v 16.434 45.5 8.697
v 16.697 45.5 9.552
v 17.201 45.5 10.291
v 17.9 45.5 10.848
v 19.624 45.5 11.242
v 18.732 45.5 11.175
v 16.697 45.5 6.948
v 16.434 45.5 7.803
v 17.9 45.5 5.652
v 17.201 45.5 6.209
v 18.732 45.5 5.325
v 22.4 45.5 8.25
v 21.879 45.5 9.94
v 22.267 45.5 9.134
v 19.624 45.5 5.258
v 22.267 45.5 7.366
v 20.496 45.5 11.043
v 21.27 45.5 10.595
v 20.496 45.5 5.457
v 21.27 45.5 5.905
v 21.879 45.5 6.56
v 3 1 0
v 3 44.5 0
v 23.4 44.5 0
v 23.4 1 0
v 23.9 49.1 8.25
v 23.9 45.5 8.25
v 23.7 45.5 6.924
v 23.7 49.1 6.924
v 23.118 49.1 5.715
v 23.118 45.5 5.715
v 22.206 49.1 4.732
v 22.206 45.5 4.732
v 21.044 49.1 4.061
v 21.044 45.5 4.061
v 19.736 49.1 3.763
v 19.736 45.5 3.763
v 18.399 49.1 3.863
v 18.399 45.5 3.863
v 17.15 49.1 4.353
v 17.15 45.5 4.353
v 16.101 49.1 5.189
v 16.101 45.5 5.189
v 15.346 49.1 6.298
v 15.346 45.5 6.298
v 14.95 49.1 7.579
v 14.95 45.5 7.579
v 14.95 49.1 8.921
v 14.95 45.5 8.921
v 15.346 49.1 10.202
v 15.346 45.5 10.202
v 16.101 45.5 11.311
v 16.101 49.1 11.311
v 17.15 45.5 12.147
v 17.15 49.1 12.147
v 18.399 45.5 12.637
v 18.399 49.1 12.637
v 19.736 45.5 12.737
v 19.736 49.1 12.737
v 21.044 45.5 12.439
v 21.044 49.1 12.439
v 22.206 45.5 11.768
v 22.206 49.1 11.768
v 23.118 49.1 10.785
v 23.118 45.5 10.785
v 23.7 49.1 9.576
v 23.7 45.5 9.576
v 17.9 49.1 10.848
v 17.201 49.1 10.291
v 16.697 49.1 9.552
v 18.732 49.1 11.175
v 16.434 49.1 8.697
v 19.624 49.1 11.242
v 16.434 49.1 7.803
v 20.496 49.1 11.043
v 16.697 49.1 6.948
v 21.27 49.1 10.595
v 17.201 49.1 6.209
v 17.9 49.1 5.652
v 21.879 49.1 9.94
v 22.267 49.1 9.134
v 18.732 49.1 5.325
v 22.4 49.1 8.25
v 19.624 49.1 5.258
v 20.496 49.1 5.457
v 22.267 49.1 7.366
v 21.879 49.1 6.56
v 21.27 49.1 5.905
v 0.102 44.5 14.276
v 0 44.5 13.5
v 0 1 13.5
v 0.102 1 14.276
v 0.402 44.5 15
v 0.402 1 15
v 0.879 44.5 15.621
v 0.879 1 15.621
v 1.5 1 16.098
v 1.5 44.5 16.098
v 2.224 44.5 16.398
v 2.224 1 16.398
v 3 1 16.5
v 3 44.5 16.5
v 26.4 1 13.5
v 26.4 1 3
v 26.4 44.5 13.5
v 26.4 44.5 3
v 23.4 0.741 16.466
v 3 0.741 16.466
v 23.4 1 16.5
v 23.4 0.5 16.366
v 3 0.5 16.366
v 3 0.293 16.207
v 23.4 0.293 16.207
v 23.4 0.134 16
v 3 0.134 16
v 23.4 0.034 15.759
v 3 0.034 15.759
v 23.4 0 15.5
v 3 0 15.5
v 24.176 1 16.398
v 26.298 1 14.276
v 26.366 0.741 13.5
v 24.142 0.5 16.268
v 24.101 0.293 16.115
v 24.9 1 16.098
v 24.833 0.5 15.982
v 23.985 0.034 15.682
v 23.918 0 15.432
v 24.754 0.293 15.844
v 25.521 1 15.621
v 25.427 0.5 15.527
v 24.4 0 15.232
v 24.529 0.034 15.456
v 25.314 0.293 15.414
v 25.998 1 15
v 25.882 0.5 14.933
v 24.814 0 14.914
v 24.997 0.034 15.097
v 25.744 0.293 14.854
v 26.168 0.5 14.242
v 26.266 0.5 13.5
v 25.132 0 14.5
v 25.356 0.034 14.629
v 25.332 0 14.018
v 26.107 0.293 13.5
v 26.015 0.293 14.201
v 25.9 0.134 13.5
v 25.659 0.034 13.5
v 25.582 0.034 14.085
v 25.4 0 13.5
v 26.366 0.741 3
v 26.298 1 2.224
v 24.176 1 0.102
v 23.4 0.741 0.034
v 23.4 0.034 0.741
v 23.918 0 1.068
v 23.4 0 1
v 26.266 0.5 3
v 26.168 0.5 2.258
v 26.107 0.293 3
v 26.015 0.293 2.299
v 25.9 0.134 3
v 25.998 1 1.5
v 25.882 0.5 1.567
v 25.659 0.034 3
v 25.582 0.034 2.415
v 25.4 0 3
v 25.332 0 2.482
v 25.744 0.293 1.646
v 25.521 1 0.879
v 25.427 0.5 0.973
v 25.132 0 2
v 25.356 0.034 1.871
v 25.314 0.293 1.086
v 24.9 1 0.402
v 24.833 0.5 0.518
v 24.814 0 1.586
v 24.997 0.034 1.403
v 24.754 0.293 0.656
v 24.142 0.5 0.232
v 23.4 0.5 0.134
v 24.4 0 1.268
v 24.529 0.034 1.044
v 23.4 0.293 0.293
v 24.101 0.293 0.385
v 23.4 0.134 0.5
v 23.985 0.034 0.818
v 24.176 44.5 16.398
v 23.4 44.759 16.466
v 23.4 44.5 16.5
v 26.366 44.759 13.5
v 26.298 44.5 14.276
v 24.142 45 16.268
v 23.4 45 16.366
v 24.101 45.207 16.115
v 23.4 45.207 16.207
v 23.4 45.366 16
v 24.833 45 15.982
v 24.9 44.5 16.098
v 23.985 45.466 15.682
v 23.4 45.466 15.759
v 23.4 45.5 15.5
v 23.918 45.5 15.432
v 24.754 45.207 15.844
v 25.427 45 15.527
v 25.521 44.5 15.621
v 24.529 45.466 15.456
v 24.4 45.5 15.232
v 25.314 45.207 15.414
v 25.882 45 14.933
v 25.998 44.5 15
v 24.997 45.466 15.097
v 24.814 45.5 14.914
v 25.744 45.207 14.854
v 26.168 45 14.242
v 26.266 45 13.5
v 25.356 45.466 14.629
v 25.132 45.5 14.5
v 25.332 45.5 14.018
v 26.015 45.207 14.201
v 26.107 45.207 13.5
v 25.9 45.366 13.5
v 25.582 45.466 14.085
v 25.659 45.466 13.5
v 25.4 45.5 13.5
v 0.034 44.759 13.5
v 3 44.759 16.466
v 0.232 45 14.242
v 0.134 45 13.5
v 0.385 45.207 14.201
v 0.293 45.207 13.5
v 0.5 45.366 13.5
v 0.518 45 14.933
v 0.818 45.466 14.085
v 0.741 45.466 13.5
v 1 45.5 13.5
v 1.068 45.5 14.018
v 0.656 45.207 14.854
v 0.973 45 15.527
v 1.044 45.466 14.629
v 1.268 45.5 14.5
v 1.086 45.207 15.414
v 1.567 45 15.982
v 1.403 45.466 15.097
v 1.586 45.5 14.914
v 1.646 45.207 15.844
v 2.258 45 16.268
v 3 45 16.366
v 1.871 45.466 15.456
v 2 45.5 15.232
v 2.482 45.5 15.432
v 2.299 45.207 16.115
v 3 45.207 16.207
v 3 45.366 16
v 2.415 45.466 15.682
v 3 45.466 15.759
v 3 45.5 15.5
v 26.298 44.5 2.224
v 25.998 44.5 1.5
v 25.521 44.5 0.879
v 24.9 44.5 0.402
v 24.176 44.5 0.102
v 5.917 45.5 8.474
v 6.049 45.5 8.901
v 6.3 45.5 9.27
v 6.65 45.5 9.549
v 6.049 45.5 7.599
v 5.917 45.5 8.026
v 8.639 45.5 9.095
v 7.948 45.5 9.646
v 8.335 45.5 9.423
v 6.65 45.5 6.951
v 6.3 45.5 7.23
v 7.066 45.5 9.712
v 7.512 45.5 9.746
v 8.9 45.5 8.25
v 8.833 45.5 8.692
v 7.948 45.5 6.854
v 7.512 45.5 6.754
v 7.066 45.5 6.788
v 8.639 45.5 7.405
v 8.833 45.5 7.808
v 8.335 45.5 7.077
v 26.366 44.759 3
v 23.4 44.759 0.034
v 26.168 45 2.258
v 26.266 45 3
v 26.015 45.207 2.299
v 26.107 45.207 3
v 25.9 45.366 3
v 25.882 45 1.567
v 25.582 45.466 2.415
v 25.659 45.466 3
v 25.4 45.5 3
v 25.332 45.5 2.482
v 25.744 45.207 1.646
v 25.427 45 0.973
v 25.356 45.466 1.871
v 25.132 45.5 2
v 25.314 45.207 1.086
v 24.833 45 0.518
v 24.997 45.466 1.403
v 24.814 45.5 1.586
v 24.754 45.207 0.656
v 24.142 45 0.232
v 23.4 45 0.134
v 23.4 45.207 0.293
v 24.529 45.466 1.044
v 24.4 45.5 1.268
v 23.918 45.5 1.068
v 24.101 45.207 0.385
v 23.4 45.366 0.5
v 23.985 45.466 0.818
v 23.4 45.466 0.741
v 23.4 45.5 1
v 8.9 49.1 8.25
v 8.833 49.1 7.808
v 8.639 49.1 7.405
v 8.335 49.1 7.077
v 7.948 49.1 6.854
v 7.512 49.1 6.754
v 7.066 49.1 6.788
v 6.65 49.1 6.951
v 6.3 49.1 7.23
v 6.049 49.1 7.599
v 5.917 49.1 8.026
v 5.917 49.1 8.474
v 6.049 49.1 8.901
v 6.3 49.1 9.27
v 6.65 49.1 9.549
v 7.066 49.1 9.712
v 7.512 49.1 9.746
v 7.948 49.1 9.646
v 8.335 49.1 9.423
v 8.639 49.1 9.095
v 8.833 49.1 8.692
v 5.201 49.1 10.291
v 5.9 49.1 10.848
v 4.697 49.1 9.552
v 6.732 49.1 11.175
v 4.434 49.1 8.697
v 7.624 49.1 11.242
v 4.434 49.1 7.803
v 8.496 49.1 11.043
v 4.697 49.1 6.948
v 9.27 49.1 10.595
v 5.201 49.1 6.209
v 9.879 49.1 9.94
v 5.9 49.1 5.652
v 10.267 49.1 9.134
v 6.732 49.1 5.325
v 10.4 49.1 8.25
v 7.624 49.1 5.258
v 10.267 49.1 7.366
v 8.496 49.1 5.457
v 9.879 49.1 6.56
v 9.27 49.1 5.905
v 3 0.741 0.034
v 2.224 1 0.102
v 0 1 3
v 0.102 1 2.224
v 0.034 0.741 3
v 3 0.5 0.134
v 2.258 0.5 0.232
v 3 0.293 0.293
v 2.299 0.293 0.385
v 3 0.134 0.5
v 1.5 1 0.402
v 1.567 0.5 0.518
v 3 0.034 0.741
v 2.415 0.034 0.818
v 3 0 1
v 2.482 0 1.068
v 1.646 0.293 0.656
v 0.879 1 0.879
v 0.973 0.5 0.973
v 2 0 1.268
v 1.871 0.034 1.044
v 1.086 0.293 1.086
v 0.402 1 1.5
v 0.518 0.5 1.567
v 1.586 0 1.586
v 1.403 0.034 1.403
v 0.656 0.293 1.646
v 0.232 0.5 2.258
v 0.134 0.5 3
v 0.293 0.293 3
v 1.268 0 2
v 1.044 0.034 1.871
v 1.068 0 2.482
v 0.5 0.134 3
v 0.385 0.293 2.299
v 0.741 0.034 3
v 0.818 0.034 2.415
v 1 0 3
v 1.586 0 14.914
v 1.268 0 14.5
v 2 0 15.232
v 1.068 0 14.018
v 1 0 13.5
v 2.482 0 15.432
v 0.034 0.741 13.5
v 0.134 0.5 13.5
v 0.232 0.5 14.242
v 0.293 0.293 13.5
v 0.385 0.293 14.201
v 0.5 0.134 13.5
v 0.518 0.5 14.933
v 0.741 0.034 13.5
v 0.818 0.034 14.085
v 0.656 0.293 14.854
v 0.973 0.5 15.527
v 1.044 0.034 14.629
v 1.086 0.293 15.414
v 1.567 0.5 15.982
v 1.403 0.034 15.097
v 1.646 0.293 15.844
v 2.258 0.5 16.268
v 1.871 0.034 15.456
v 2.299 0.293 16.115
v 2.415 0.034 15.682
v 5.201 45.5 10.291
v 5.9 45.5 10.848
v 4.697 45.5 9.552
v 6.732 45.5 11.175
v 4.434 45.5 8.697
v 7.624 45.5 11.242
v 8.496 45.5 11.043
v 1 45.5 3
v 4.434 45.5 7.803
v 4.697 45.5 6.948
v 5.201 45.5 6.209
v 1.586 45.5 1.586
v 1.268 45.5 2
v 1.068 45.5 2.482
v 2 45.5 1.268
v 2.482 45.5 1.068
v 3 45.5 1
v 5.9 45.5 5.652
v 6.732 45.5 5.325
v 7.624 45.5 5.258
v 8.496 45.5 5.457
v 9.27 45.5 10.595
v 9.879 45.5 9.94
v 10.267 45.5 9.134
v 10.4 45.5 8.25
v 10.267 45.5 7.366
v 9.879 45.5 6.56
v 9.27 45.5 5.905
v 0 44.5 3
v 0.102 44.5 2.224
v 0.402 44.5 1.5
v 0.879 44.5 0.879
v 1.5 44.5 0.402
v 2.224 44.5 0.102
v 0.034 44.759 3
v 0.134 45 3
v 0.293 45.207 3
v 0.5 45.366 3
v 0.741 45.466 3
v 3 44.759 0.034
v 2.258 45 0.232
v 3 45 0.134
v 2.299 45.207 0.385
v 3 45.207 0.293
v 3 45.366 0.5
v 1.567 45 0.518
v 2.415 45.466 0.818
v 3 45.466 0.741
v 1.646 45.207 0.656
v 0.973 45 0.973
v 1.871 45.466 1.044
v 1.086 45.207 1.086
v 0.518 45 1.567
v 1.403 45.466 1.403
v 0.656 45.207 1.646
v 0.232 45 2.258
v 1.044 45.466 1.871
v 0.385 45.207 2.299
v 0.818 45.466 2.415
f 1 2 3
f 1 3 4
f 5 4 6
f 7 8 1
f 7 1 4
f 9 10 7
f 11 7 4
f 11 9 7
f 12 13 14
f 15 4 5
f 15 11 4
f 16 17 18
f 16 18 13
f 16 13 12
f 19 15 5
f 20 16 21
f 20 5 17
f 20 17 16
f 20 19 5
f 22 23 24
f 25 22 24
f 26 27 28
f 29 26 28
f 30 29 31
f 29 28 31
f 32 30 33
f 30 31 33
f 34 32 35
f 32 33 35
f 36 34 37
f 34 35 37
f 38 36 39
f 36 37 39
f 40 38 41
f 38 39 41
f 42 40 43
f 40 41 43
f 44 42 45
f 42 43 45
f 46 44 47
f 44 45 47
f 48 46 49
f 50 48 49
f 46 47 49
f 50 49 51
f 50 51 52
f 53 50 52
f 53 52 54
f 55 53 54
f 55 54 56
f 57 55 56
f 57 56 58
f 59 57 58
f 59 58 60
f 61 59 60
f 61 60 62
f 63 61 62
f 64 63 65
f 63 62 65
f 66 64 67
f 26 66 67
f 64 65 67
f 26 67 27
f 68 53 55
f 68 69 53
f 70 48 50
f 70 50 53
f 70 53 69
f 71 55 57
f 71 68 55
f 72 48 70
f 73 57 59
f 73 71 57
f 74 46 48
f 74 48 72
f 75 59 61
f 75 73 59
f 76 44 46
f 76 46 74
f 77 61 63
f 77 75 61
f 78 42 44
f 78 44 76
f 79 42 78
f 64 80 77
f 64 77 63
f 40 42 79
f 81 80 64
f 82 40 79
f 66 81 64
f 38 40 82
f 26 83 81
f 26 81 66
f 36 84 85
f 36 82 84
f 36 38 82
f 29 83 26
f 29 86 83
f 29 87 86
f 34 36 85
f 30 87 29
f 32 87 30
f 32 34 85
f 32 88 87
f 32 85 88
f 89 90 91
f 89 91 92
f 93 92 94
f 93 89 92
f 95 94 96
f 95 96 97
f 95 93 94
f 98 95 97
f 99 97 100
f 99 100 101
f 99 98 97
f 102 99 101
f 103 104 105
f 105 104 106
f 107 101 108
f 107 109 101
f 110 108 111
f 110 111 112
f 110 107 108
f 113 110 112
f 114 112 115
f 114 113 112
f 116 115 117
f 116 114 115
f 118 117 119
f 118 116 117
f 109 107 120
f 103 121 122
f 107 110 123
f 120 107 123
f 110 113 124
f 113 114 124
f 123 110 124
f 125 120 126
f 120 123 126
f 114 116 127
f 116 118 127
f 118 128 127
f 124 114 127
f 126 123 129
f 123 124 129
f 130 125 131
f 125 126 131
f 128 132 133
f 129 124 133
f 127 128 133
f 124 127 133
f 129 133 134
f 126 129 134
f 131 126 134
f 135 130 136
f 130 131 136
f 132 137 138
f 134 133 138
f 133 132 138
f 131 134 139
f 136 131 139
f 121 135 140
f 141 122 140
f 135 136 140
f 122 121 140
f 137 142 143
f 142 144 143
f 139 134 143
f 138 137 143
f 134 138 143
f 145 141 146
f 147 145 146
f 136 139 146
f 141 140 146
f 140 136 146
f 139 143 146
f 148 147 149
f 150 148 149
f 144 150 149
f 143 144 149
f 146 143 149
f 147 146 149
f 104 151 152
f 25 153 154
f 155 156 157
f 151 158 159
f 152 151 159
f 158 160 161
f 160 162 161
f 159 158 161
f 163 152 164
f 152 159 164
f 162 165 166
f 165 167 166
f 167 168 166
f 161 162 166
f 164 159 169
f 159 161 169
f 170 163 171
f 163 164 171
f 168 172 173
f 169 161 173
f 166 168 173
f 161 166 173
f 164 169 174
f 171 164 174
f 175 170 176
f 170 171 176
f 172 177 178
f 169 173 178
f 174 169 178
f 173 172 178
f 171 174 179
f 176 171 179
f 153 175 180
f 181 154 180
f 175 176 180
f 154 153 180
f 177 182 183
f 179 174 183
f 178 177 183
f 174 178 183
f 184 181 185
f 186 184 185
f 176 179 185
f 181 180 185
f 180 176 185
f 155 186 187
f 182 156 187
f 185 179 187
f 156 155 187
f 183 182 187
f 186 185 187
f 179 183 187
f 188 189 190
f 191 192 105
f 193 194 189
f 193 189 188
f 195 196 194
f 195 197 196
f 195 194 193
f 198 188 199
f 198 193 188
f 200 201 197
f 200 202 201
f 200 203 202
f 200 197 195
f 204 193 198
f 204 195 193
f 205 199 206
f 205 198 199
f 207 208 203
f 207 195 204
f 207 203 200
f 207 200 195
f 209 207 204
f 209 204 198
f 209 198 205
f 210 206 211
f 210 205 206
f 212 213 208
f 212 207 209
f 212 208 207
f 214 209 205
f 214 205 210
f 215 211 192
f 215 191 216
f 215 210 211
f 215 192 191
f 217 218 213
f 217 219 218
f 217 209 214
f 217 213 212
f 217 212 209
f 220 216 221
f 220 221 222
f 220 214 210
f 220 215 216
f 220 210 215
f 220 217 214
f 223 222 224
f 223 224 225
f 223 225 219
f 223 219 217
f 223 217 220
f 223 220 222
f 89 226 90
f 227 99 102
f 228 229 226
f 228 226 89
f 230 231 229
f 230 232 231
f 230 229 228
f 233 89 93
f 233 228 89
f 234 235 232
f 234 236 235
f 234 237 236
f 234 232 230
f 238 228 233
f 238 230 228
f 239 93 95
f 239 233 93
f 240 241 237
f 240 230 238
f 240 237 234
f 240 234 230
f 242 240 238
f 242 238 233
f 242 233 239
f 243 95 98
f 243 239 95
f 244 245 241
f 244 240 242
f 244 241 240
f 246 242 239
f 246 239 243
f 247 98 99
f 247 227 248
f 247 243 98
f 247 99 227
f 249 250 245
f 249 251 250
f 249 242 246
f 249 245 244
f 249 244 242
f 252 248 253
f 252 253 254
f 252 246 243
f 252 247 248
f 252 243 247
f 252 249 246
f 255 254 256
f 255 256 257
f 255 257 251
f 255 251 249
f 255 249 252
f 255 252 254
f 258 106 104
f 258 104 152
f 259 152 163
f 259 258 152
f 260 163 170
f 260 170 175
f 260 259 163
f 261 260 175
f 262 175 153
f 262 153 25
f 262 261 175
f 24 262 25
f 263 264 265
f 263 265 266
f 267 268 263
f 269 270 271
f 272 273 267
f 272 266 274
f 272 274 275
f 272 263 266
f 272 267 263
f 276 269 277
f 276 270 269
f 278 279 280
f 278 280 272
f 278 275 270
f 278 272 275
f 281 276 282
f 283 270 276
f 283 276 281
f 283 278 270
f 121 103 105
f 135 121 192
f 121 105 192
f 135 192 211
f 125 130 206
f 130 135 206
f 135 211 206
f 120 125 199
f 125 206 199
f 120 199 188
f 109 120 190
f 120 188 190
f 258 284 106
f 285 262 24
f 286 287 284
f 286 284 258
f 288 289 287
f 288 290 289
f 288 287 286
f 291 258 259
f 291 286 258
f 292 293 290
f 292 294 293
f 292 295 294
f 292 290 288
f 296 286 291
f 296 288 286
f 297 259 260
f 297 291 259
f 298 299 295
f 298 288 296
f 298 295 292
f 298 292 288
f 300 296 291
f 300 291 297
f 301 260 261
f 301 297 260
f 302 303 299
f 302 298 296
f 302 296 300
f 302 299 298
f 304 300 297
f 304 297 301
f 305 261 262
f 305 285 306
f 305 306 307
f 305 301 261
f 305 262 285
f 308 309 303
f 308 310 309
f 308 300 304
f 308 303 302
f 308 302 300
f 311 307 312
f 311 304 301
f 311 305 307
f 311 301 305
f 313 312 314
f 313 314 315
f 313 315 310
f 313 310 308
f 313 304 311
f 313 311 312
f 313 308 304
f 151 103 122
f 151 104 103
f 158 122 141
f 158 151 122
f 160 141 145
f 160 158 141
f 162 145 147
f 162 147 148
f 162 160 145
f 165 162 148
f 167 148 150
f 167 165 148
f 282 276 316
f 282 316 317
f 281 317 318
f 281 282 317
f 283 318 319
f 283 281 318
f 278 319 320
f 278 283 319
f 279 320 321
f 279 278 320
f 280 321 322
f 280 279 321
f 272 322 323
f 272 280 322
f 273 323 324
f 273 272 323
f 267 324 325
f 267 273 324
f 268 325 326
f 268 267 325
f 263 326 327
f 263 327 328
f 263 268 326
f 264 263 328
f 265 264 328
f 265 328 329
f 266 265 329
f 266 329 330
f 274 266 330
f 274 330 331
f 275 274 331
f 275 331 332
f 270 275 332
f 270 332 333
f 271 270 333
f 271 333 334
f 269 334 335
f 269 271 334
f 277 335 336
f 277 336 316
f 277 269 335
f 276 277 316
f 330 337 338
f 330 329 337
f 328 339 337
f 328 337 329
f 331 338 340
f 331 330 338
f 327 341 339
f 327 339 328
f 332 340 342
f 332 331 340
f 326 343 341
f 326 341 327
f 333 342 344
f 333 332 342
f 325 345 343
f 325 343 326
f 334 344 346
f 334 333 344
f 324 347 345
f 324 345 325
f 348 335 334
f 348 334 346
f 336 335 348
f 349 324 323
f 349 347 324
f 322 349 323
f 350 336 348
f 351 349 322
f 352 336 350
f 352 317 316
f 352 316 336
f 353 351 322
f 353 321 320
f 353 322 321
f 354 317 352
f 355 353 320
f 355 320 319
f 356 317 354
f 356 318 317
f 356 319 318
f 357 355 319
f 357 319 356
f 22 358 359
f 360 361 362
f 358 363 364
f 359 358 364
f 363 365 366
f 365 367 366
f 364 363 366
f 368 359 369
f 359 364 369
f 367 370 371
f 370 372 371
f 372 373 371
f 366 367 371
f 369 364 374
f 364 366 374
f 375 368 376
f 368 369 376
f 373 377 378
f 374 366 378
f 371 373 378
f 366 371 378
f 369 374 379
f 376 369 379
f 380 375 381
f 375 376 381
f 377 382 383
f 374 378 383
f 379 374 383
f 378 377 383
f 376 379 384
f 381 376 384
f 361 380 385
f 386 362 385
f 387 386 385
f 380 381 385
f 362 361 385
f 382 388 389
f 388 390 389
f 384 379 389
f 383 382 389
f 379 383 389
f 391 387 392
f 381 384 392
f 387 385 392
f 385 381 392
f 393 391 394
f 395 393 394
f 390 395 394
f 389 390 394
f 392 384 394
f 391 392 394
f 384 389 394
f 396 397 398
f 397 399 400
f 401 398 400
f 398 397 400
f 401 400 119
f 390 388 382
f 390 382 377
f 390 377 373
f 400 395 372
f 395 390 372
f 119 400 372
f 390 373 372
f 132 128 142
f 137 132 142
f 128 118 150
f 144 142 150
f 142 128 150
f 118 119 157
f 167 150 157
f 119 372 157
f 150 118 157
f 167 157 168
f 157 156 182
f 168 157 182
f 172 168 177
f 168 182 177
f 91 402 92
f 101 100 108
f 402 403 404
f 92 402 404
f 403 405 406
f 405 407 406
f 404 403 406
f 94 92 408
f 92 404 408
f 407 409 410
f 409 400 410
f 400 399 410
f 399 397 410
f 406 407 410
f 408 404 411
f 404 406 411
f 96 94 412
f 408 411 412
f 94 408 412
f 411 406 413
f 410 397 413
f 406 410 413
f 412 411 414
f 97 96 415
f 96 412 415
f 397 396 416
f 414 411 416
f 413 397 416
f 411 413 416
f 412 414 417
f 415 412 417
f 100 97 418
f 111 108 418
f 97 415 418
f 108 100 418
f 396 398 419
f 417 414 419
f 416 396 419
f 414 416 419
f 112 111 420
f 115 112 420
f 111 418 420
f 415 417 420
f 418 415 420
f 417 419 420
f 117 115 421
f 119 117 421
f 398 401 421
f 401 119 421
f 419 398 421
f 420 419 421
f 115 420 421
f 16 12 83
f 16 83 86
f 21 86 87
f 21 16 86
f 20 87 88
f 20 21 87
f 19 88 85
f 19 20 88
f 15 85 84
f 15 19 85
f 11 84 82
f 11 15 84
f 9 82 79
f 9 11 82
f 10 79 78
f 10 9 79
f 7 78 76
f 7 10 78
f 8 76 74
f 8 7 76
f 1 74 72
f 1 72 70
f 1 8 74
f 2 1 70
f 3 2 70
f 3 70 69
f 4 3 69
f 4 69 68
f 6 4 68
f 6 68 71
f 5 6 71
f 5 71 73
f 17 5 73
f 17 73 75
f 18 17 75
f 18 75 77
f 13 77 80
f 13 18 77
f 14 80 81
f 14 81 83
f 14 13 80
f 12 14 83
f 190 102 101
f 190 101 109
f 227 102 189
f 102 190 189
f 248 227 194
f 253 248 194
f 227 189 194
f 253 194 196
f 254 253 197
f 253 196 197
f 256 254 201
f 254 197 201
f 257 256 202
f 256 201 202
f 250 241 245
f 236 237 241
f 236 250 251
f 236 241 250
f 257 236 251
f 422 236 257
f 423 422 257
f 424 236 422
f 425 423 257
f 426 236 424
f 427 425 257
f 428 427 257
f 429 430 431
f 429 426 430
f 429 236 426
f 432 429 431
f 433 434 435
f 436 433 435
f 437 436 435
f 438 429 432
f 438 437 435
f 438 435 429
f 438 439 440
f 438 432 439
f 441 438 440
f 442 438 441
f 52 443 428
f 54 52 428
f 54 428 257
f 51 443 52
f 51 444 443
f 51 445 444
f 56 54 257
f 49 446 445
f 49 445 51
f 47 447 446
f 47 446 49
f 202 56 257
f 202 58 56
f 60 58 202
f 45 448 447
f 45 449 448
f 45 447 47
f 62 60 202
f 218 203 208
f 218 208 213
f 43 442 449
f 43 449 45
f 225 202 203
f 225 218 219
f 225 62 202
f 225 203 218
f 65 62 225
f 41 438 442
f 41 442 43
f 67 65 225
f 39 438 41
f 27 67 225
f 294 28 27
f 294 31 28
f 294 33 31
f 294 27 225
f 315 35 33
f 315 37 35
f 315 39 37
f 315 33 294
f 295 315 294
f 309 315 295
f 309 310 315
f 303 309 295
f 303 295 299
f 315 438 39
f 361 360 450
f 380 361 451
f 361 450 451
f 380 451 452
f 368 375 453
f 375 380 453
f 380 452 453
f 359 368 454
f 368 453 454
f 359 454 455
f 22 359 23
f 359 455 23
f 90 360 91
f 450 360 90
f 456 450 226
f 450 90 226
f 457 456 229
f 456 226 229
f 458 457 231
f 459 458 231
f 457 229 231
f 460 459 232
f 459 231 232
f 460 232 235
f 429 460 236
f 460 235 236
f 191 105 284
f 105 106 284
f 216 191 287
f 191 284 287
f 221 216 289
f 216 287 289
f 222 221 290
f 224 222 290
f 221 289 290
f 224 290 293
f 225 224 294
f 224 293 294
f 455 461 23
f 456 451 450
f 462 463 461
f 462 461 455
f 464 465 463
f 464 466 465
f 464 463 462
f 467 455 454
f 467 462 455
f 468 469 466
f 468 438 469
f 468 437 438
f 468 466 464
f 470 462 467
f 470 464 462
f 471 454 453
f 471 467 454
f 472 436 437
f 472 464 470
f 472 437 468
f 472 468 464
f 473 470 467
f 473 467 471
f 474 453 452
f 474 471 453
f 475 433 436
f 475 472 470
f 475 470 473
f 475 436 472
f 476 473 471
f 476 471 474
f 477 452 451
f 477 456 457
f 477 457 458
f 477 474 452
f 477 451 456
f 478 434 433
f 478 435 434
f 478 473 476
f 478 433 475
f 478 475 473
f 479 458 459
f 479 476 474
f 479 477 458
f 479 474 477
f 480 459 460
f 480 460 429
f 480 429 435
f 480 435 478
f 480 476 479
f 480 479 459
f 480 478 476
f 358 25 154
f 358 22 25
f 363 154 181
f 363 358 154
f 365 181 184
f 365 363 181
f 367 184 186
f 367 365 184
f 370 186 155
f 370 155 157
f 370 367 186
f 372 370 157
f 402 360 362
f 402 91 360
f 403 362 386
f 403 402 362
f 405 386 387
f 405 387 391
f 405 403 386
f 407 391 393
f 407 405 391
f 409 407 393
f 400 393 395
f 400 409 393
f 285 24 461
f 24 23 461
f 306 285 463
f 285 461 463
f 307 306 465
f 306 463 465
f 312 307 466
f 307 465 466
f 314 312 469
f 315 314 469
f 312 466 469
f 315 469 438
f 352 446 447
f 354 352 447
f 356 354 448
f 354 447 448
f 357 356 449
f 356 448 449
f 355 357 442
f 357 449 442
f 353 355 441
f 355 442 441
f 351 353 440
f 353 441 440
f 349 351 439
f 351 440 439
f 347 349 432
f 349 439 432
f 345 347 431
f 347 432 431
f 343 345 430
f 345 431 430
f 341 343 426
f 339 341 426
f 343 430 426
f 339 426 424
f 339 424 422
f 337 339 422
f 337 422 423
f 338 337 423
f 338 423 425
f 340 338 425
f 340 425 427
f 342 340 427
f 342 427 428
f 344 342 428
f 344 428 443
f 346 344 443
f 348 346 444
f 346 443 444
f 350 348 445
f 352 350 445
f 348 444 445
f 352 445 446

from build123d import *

# Parameters (mm, degrees)
SKETCH_1_W      = 26.4
SKETCH_1_H      = 45.5
EXTRUDE_1_DEPTH = 16.5
FILLET_1_R      = 3
SKETCH_2_R      = 3
SKETCH_2_R_2    = 1.5
SKETCH_2_R_3    = 4.5
EXTRUDE_2_DEPTH = 3.6
FILLET_2_R      = 1


with BuildPart() as part:
    # 草圖1 → 填料-伸長1 (new body)
    with BuildSketch(Plane.XY):
        with Locations((13.2, 22.75)):
            Rectangle(SKETCH_1_W, SKETCH_1_H)
    extrude(amount=EXTRUDE_1_DEPTH)

    # 圓角1
    fillet_1_edges = [part.edges().sort_by_distance(p)[0] for p in [
        (26.4, 22.75, 16.5),
        (0, 22.75, 16.5),
        (26.4, 22.75, 0),
        (0, 22.75, 0),
    ]]
    fillet(fillet_1_edges, radius=FILLET_1_R)

    # 草圖2 → 填料-伸長2 (add)
    with BuildSketch(Plane(origin=(0, 45.5, 0), x_dir=(1, 0, 0), z_dir=(0, 1, 0))):
        with Locations((7.4, -8.25)):
            Circle(SKETCH_2_R)
        with Locations((7.4, -8.25)):
            Circle(SKETCH_2_R_2, mode=Mode.SUBTRACT)
        with Locations((19.4, -8.25)):
            Circle(SKETCH_2_R_3)
        with Locations((19.4, -8.25)):
            Circle(SKETCH_2_R, mode=Mode.SUBTRACT)
    extrude(amount=EXTRUDE_2_DEPTH)

    # 圓角2
    fillet_2_edges = [part.edges().sort_by_distance(p)[0] for p in [
        (0, 0, 8.25),
        (0, 45.5, 8.25),
        (13.2, 0, 0),
        (26.4, 0, 8.25),
        (13.2, 0, 16.5),
        (25.521320344, 0, 15.621320344),
        (25.521320344, 0, 0.878679656),
        (0.878679656, 0, 15.621320344),
        (0.878679656, 0, 0.878679656),
        (13.2, 45.5, 0),
        (13.2, 45.5, 16.5),
        (26.4, 45.5, 8.25),
        (25.521320344, 45.5, 15.621320344),
        (25.521320344, 45.5, 0.878679656),
        (0.878679656, 45.5, 15.621320344),
        (0.878679656, 45.5, 0.878679656),
    ]]
    fillet(fillet_2_edges, radius=FILLET_2_R)


solid = part.part
